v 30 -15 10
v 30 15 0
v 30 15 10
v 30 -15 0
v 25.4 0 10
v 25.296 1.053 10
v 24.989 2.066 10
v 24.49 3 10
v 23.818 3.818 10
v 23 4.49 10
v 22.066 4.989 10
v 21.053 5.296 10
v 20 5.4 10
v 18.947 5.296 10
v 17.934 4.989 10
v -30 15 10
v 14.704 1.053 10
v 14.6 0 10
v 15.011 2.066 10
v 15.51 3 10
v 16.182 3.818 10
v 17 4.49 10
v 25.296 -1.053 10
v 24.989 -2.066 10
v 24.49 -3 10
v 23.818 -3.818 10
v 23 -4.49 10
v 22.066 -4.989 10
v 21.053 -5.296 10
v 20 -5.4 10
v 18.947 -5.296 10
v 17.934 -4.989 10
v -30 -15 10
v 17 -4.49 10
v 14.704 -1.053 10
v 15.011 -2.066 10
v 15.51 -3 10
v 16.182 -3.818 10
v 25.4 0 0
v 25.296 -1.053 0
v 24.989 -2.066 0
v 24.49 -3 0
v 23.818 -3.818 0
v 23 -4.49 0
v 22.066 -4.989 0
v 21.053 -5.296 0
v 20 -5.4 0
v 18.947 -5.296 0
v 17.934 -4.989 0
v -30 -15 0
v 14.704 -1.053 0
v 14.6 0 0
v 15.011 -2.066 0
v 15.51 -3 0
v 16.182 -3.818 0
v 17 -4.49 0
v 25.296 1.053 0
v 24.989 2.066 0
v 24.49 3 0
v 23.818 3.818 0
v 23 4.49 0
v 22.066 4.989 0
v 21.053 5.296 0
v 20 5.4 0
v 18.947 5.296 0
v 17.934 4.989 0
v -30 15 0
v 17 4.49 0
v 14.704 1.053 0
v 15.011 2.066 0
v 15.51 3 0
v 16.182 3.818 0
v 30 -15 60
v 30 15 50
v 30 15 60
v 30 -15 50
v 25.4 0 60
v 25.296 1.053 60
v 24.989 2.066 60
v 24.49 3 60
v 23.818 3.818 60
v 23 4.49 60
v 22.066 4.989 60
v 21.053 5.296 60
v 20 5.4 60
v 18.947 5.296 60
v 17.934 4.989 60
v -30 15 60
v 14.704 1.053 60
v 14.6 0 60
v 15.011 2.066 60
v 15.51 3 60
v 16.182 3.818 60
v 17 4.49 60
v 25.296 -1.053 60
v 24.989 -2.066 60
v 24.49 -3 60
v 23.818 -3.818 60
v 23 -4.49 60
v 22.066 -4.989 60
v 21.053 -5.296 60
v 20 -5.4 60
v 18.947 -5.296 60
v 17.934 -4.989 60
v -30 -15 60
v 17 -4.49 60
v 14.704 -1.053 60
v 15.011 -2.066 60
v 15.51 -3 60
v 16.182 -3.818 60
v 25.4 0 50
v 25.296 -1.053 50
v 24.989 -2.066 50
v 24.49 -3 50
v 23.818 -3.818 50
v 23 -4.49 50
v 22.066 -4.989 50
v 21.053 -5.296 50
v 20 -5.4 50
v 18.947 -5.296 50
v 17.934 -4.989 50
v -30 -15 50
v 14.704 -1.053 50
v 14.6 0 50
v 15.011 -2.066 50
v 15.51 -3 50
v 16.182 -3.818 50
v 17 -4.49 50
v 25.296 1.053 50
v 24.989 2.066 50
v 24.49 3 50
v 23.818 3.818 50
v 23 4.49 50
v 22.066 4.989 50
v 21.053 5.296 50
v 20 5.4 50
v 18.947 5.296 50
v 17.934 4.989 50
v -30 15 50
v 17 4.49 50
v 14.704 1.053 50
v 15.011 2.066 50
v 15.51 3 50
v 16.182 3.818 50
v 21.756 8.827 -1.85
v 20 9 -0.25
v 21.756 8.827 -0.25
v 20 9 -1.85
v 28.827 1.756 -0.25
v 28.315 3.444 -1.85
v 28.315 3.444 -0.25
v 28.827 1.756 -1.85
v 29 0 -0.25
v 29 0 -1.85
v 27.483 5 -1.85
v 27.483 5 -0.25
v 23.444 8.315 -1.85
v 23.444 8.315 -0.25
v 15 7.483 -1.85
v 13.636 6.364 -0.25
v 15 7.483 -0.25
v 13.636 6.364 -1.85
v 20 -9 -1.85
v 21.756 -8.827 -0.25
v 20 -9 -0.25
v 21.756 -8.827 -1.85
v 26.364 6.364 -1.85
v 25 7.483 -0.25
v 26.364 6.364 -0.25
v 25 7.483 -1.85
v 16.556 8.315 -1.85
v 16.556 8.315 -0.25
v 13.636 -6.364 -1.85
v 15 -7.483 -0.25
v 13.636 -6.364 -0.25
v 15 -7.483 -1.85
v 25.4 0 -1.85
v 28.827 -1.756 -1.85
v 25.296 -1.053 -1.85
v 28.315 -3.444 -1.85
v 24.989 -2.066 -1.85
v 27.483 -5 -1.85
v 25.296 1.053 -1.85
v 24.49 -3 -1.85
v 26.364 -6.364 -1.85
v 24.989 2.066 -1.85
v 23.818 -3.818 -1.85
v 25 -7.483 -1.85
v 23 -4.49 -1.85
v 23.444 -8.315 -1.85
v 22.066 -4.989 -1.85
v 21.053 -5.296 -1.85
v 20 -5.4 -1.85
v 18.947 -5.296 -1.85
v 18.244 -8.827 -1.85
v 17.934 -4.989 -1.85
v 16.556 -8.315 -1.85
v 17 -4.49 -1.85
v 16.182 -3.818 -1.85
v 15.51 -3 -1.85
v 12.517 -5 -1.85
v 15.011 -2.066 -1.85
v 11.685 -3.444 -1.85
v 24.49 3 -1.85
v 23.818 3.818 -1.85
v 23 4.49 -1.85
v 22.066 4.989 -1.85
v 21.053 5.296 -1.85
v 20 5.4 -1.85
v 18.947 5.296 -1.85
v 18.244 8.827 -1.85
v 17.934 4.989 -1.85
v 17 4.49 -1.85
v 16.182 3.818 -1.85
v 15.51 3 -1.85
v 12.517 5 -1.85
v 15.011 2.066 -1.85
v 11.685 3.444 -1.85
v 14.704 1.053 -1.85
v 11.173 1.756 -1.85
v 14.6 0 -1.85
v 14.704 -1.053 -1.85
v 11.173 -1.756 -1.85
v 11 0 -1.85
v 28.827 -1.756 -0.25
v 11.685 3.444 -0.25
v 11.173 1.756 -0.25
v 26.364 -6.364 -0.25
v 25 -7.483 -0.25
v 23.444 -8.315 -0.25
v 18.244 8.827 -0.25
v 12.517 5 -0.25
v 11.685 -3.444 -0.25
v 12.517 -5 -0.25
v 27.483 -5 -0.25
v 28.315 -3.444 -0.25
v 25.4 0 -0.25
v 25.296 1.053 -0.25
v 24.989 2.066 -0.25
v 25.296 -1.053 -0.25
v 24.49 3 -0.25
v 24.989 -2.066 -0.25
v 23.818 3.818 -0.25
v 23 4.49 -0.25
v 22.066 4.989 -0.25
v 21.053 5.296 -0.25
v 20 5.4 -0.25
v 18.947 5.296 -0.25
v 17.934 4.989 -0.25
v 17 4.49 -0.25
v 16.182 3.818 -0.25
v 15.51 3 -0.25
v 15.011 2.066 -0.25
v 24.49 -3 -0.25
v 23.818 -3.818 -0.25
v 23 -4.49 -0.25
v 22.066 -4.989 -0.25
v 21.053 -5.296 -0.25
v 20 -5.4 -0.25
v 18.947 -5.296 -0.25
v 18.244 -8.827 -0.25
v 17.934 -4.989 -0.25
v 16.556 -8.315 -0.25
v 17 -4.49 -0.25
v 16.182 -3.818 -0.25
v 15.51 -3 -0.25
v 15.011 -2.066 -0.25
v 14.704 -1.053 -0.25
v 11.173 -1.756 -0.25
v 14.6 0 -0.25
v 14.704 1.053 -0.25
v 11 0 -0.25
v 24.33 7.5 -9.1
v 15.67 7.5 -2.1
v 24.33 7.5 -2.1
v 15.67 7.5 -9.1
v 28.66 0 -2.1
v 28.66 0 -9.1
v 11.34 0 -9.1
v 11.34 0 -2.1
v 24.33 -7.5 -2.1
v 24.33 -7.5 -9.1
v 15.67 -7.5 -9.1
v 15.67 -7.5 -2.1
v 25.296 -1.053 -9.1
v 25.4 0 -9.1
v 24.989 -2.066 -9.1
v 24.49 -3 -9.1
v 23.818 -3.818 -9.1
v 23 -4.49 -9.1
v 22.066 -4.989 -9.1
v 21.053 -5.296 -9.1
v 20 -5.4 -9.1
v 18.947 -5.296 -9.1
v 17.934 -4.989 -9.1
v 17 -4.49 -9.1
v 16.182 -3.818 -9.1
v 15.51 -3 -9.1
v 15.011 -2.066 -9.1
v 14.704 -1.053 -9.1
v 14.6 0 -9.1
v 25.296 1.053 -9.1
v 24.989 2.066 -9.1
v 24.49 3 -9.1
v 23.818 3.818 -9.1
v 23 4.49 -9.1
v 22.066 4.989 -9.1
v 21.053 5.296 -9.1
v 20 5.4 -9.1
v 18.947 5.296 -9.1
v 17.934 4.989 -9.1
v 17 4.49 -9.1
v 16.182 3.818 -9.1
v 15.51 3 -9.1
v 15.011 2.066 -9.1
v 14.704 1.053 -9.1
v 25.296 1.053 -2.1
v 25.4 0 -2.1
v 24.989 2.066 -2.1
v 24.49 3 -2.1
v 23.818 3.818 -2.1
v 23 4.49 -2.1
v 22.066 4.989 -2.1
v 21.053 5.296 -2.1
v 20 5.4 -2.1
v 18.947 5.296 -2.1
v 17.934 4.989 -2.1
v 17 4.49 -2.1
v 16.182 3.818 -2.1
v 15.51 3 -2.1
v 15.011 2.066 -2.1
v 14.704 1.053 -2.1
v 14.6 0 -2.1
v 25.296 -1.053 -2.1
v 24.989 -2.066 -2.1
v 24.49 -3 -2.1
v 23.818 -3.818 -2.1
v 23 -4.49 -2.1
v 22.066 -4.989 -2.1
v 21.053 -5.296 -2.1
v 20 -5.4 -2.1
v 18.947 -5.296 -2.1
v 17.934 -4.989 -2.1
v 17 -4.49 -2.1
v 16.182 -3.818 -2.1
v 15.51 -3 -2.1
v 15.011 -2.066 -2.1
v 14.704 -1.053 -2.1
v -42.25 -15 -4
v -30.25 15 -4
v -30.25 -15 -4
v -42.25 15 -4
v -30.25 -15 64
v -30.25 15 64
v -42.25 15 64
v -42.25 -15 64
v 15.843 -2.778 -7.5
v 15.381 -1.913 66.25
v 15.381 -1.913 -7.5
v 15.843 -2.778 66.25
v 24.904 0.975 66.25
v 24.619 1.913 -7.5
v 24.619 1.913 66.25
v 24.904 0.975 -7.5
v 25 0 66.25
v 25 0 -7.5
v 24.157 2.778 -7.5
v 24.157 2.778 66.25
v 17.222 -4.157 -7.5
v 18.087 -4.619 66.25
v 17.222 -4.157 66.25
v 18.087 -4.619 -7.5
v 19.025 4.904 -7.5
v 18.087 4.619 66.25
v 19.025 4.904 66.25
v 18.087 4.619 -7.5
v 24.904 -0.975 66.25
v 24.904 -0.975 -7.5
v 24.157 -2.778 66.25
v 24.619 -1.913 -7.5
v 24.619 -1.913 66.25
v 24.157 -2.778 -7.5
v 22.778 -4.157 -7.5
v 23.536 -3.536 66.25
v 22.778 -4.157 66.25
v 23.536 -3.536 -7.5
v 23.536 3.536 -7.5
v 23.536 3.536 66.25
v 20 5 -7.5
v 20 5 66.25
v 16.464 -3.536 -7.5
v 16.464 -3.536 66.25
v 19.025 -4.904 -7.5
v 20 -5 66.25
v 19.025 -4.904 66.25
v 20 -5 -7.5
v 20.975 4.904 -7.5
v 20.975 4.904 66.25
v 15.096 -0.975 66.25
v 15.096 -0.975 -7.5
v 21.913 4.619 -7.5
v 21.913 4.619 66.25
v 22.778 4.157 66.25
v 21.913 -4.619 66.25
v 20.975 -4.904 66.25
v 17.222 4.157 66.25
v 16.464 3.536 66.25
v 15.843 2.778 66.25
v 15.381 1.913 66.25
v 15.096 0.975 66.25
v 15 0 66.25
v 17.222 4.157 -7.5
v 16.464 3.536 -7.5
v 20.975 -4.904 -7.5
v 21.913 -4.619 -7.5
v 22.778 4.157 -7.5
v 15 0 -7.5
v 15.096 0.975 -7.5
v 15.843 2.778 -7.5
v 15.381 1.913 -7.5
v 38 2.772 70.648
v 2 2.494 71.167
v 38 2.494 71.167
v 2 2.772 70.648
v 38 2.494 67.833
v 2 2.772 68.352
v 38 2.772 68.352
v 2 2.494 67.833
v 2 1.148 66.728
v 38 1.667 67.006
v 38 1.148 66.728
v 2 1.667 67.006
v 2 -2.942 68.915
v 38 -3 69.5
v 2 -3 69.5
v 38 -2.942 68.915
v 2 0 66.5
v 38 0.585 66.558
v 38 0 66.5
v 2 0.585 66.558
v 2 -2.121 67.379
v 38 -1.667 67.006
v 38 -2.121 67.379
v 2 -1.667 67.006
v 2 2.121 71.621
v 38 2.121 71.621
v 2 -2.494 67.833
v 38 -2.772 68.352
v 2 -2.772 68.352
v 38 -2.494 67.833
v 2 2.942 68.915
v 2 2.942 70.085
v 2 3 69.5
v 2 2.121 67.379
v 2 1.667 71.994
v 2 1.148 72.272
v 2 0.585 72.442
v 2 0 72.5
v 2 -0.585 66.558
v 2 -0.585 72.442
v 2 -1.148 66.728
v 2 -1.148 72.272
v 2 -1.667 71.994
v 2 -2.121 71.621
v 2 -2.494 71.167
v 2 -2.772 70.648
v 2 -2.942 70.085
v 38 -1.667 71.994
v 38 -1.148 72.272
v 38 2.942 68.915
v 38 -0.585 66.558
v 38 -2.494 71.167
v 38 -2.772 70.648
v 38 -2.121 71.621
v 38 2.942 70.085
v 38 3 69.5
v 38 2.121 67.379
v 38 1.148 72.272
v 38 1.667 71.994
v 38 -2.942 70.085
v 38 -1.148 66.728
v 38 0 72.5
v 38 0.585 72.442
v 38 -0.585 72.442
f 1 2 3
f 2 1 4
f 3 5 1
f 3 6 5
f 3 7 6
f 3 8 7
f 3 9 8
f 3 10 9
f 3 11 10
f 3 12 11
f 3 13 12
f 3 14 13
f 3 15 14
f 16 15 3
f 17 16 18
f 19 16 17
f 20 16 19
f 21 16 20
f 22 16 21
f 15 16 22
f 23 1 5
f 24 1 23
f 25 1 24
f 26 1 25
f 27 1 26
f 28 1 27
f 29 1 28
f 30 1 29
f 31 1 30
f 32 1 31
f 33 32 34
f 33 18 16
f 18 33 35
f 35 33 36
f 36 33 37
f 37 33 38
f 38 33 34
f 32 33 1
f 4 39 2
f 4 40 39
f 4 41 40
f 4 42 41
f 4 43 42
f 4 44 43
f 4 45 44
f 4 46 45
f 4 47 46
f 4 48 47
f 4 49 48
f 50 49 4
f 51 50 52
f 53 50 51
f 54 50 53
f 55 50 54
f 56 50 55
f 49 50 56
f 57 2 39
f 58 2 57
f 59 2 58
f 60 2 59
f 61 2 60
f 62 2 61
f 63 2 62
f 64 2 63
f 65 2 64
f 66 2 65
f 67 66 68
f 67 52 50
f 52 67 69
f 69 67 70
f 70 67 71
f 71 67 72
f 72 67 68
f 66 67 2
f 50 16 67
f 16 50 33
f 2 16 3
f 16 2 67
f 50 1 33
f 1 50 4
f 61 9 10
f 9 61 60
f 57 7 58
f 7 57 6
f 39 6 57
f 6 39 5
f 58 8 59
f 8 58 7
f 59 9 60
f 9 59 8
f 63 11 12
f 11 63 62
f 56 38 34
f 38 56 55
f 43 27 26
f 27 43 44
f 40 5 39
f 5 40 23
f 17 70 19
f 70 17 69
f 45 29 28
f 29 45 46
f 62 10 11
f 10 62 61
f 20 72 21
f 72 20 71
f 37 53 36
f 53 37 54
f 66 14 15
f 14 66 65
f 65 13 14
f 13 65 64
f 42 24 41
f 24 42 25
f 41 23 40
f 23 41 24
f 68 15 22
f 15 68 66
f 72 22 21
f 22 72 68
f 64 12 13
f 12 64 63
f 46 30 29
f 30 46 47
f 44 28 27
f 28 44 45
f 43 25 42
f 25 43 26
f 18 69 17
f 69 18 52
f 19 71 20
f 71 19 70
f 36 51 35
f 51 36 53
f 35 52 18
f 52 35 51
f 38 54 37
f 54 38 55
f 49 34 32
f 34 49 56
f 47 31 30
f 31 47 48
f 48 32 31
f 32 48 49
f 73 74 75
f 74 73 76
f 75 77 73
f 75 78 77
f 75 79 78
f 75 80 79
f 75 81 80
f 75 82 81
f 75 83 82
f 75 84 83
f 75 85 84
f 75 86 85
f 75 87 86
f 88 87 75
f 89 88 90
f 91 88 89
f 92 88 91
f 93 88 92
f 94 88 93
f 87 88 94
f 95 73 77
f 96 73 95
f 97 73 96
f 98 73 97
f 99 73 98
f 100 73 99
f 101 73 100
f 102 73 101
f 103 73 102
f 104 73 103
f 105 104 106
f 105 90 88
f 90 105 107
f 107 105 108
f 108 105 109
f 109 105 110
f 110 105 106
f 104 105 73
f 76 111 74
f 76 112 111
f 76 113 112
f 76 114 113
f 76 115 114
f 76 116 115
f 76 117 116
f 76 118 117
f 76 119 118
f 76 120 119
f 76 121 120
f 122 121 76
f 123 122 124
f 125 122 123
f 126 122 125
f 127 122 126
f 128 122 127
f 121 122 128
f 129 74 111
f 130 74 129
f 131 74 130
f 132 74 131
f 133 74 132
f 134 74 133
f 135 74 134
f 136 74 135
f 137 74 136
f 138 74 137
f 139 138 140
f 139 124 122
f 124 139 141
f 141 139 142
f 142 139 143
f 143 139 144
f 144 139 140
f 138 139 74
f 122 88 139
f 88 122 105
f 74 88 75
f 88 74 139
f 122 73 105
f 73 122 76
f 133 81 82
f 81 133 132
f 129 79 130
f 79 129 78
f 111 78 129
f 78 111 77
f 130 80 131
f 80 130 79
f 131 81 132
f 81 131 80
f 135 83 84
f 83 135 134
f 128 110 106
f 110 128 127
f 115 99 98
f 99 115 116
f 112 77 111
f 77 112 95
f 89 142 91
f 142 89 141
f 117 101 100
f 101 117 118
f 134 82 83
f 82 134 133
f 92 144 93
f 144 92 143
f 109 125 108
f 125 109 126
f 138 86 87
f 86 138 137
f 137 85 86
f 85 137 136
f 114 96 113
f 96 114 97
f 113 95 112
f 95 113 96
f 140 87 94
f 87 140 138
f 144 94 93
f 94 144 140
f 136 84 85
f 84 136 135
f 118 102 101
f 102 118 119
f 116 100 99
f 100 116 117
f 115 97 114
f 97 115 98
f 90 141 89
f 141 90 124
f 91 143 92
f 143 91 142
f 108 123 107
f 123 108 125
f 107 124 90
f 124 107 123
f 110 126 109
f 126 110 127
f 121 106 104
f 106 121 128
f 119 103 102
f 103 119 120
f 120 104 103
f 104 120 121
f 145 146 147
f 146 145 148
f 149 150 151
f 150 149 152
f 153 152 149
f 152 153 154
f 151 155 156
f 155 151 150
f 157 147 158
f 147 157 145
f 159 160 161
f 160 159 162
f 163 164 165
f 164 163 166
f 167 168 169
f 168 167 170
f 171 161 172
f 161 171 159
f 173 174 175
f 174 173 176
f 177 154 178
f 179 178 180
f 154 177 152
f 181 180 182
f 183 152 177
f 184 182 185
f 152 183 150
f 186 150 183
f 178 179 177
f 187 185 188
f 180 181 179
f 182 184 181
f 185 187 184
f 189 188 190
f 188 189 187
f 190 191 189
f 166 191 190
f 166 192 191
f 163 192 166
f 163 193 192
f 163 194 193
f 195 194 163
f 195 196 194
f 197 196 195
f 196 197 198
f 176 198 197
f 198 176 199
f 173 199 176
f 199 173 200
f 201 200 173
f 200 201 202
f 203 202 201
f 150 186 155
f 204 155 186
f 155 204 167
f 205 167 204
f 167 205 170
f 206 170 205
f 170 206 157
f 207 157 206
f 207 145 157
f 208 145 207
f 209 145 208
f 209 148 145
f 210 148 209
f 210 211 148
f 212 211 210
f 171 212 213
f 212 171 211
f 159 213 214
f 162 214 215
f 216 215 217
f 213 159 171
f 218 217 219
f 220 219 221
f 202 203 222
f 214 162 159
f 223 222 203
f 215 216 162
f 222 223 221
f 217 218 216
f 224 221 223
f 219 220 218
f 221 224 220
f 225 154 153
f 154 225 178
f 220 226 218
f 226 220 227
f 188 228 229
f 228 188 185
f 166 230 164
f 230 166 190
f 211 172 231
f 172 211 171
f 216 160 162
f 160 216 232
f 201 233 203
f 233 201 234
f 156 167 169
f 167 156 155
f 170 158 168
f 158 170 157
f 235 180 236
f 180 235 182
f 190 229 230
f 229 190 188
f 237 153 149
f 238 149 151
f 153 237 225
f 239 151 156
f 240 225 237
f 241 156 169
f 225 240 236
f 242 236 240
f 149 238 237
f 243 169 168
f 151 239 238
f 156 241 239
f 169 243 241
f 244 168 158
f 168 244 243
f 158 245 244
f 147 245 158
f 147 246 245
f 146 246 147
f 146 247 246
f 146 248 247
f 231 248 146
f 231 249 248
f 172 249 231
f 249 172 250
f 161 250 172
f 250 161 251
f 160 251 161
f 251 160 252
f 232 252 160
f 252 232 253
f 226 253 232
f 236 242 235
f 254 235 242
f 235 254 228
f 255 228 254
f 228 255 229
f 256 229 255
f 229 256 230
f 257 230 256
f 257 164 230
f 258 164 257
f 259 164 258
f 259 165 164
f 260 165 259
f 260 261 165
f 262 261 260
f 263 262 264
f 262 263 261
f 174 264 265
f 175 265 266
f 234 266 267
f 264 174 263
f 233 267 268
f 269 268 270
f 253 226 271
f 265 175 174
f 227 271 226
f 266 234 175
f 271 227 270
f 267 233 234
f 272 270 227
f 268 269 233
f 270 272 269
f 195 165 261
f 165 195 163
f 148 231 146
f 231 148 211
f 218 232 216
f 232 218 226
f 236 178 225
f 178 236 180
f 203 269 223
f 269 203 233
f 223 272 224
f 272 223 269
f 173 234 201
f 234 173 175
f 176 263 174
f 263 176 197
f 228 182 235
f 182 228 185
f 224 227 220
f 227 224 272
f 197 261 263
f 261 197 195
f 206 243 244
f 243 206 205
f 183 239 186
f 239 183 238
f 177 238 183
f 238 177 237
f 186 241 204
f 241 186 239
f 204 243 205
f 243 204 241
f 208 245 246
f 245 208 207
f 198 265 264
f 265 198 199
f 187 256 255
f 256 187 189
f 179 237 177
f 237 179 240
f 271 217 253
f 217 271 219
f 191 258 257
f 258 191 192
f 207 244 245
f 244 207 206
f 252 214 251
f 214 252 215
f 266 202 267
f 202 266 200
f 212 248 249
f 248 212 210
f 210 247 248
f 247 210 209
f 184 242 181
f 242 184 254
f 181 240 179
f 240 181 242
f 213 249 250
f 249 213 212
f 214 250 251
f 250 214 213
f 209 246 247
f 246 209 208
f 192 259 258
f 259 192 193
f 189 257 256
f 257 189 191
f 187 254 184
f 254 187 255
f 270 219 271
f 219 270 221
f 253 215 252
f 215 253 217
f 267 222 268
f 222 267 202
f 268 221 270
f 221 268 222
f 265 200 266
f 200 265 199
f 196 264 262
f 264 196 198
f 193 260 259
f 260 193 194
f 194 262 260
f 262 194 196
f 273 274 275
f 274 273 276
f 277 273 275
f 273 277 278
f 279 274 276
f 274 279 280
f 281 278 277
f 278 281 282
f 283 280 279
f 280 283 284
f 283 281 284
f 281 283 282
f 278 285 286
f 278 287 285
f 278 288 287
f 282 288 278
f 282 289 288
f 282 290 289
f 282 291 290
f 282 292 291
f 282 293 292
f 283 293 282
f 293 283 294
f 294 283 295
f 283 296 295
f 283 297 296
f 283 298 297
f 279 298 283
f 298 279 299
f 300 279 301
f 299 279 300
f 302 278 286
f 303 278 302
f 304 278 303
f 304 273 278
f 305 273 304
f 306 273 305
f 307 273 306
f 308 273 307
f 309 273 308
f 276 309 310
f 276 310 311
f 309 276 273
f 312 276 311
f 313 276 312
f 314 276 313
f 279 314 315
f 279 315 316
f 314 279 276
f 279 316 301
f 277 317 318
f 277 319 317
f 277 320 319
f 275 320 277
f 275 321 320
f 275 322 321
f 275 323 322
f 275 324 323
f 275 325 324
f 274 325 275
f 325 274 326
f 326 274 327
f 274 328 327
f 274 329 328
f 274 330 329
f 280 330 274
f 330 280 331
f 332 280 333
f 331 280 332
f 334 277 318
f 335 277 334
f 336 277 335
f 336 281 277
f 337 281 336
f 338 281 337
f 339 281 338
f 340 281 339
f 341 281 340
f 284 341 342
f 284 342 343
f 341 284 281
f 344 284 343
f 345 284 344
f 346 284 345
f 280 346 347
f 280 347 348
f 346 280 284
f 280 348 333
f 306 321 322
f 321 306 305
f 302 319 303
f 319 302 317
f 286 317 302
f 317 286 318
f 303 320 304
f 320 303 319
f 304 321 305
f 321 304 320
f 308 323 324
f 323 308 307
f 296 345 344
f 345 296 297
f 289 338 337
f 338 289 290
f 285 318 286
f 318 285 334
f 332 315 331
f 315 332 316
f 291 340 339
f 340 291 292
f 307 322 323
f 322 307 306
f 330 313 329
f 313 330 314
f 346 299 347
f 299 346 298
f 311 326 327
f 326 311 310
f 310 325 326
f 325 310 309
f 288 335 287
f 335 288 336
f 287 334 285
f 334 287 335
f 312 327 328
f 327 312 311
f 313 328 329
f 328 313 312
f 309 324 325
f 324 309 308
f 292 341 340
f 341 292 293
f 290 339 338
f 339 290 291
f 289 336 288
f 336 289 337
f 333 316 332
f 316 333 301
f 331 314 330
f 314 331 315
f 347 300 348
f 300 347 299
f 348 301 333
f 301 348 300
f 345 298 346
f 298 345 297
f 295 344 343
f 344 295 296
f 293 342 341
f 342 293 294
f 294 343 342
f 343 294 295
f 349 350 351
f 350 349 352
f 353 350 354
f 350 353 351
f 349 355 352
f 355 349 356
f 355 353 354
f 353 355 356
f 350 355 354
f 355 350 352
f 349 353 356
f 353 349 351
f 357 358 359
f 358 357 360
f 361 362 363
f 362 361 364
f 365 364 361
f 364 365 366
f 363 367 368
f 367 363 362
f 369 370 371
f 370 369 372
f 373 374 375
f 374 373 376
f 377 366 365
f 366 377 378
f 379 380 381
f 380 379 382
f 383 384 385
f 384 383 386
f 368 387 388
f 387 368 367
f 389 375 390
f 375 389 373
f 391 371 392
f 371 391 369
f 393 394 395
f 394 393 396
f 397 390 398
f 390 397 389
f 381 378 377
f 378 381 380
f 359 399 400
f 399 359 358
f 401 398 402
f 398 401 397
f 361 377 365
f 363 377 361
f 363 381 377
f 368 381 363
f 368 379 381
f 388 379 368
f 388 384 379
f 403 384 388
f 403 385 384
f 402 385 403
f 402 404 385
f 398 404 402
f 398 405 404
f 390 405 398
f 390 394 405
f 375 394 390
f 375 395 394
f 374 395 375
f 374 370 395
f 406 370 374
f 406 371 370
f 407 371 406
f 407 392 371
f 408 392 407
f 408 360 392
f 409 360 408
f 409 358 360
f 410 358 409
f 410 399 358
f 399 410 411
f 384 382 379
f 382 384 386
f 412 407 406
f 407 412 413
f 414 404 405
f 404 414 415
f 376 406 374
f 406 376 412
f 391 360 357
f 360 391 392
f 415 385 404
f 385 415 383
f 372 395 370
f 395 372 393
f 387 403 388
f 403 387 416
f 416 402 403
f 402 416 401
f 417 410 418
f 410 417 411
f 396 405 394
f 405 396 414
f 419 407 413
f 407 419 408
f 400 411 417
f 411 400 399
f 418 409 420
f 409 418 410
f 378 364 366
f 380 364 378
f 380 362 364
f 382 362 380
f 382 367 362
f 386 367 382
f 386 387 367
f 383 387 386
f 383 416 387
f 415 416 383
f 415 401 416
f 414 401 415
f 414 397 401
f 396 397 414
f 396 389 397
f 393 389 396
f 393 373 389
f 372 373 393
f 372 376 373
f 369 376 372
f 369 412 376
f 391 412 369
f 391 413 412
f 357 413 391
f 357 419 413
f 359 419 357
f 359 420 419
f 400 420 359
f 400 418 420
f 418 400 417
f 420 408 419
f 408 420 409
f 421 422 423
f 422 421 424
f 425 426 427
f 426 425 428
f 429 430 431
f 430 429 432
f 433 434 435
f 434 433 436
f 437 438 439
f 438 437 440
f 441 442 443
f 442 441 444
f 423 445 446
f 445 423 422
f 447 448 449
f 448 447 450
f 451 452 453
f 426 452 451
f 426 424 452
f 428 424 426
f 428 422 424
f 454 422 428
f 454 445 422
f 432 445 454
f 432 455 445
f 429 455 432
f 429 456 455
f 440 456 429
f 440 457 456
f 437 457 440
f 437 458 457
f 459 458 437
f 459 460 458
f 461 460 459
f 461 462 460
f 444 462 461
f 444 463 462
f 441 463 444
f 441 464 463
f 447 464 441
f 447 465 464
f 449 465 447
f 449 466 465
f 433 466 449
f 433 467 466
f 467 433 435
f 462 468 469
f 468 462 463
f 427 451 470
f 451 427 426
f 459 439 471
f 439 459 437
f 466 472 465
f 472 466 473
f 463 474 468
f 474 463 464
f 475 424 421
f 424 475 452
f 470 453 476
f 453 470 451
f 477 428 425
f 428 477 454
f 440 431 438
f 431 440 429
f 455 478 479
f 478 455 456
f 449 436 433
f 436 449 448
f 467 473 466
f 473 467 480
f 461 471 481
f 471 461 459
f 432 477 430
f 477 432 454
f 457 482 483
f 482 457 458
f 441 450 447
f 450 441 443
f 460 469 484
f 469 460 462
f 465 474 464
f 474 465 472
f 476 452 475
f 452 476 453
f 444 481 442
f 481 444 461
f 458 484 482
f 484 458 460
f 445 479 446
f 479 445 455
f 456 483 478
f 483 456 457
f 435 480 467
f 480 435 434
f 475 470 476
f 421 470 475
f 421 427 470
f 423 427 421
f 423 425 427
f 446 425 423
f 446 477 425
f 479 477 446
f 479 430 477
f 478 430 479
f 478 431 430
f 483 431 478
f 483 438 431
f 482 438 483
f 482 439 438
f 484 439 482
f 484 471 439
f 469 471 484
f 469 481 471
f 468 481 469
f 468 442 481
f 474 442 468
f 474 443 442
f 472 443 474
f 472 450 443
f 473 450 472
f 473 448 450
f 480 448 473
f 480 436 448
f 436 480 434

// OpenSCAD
$fn = 32;

// ------------------------------------------------------------------------
// C clamp: throat 50 mm, screw d10
// Every part is its own module, assembly() places every instance.
// ------------------------------------------------------------------------

// --- part 1 ---
module clamp_arm() {
  difference() {
    translate([-30, -15, 0]) cube([60, 30, 10]);
    translate([20, 0, -1]) cylinder(h = 12, d = 10.8);
  }
}

// --- part 2 ---
module clamp_spine() {
  difference() {
    translate([-34, -15, 0]) cube([68, 30, 12]);
  }
}

// --- part 3 ---
module clamp_screw() {
  translate([0, 0, -36.875]) cylinder(h = 73.75, d = 10);
}

// --- part 4 ---
module clamp_washer() {
  difference() {
      translate([0, 0, 0]) cylinder(h = 1.6, d = 18);
      translate([0, 0, -1]) cylinder(h = 3.6, d = 10.8);
    }
}

// --- part 5 ---
module clamp_nut() {
  difference() {
    linear_extrude(height = 7) polygon(points = [[8.66, 0], [4.33, 7.5], [-4.33, 7.5], [-8.66, 0], [-4.33, -7.5], [4.33, -7.5]]);
    translate([0, 0, -1]) cylinder(h = 9, d = 10.8);
  }
}

// --- part 6 ---
module tommy_bar() {
  translate([0, 0, -18]) cylinder(h = 36, d = 6);
}

// --- assembly ---
module assembly() {
  color([0.80, 0.24, 0.20]) translate([0, 0, 0]) rotate([0, 0, 0]) clamp_arm();
  color([0.20, 0.45, 0.75]) translate([0, 0, 50]) rotate([0, 0, 0]) clamp_arm();
  color([0.25, 0.62, 0.32]) translate([-42.25, 0, 30]) rotate([0, 90, 0]) clamp_spine();
  color([0.92, 0.70, 0.18]) translate([20, 0, 29.375]) rotate([0, 0, 0]) clamp_screw();
  color([0.58, 0.35, 0.70]) translate([20, 0, -1.85]) rotate([0, 0, 0]) clamp_washer();
  color([0.16, 0.66, 0.66]) translate([20, 0, -9.1]) rotate([0, 0, 0]) clamp_nut();
  color([0.85, 0.48, 0.18]) translate([20, 0, 69.5]) rotate([0, 90, 0]) tommy_bar();
}

assembly();
